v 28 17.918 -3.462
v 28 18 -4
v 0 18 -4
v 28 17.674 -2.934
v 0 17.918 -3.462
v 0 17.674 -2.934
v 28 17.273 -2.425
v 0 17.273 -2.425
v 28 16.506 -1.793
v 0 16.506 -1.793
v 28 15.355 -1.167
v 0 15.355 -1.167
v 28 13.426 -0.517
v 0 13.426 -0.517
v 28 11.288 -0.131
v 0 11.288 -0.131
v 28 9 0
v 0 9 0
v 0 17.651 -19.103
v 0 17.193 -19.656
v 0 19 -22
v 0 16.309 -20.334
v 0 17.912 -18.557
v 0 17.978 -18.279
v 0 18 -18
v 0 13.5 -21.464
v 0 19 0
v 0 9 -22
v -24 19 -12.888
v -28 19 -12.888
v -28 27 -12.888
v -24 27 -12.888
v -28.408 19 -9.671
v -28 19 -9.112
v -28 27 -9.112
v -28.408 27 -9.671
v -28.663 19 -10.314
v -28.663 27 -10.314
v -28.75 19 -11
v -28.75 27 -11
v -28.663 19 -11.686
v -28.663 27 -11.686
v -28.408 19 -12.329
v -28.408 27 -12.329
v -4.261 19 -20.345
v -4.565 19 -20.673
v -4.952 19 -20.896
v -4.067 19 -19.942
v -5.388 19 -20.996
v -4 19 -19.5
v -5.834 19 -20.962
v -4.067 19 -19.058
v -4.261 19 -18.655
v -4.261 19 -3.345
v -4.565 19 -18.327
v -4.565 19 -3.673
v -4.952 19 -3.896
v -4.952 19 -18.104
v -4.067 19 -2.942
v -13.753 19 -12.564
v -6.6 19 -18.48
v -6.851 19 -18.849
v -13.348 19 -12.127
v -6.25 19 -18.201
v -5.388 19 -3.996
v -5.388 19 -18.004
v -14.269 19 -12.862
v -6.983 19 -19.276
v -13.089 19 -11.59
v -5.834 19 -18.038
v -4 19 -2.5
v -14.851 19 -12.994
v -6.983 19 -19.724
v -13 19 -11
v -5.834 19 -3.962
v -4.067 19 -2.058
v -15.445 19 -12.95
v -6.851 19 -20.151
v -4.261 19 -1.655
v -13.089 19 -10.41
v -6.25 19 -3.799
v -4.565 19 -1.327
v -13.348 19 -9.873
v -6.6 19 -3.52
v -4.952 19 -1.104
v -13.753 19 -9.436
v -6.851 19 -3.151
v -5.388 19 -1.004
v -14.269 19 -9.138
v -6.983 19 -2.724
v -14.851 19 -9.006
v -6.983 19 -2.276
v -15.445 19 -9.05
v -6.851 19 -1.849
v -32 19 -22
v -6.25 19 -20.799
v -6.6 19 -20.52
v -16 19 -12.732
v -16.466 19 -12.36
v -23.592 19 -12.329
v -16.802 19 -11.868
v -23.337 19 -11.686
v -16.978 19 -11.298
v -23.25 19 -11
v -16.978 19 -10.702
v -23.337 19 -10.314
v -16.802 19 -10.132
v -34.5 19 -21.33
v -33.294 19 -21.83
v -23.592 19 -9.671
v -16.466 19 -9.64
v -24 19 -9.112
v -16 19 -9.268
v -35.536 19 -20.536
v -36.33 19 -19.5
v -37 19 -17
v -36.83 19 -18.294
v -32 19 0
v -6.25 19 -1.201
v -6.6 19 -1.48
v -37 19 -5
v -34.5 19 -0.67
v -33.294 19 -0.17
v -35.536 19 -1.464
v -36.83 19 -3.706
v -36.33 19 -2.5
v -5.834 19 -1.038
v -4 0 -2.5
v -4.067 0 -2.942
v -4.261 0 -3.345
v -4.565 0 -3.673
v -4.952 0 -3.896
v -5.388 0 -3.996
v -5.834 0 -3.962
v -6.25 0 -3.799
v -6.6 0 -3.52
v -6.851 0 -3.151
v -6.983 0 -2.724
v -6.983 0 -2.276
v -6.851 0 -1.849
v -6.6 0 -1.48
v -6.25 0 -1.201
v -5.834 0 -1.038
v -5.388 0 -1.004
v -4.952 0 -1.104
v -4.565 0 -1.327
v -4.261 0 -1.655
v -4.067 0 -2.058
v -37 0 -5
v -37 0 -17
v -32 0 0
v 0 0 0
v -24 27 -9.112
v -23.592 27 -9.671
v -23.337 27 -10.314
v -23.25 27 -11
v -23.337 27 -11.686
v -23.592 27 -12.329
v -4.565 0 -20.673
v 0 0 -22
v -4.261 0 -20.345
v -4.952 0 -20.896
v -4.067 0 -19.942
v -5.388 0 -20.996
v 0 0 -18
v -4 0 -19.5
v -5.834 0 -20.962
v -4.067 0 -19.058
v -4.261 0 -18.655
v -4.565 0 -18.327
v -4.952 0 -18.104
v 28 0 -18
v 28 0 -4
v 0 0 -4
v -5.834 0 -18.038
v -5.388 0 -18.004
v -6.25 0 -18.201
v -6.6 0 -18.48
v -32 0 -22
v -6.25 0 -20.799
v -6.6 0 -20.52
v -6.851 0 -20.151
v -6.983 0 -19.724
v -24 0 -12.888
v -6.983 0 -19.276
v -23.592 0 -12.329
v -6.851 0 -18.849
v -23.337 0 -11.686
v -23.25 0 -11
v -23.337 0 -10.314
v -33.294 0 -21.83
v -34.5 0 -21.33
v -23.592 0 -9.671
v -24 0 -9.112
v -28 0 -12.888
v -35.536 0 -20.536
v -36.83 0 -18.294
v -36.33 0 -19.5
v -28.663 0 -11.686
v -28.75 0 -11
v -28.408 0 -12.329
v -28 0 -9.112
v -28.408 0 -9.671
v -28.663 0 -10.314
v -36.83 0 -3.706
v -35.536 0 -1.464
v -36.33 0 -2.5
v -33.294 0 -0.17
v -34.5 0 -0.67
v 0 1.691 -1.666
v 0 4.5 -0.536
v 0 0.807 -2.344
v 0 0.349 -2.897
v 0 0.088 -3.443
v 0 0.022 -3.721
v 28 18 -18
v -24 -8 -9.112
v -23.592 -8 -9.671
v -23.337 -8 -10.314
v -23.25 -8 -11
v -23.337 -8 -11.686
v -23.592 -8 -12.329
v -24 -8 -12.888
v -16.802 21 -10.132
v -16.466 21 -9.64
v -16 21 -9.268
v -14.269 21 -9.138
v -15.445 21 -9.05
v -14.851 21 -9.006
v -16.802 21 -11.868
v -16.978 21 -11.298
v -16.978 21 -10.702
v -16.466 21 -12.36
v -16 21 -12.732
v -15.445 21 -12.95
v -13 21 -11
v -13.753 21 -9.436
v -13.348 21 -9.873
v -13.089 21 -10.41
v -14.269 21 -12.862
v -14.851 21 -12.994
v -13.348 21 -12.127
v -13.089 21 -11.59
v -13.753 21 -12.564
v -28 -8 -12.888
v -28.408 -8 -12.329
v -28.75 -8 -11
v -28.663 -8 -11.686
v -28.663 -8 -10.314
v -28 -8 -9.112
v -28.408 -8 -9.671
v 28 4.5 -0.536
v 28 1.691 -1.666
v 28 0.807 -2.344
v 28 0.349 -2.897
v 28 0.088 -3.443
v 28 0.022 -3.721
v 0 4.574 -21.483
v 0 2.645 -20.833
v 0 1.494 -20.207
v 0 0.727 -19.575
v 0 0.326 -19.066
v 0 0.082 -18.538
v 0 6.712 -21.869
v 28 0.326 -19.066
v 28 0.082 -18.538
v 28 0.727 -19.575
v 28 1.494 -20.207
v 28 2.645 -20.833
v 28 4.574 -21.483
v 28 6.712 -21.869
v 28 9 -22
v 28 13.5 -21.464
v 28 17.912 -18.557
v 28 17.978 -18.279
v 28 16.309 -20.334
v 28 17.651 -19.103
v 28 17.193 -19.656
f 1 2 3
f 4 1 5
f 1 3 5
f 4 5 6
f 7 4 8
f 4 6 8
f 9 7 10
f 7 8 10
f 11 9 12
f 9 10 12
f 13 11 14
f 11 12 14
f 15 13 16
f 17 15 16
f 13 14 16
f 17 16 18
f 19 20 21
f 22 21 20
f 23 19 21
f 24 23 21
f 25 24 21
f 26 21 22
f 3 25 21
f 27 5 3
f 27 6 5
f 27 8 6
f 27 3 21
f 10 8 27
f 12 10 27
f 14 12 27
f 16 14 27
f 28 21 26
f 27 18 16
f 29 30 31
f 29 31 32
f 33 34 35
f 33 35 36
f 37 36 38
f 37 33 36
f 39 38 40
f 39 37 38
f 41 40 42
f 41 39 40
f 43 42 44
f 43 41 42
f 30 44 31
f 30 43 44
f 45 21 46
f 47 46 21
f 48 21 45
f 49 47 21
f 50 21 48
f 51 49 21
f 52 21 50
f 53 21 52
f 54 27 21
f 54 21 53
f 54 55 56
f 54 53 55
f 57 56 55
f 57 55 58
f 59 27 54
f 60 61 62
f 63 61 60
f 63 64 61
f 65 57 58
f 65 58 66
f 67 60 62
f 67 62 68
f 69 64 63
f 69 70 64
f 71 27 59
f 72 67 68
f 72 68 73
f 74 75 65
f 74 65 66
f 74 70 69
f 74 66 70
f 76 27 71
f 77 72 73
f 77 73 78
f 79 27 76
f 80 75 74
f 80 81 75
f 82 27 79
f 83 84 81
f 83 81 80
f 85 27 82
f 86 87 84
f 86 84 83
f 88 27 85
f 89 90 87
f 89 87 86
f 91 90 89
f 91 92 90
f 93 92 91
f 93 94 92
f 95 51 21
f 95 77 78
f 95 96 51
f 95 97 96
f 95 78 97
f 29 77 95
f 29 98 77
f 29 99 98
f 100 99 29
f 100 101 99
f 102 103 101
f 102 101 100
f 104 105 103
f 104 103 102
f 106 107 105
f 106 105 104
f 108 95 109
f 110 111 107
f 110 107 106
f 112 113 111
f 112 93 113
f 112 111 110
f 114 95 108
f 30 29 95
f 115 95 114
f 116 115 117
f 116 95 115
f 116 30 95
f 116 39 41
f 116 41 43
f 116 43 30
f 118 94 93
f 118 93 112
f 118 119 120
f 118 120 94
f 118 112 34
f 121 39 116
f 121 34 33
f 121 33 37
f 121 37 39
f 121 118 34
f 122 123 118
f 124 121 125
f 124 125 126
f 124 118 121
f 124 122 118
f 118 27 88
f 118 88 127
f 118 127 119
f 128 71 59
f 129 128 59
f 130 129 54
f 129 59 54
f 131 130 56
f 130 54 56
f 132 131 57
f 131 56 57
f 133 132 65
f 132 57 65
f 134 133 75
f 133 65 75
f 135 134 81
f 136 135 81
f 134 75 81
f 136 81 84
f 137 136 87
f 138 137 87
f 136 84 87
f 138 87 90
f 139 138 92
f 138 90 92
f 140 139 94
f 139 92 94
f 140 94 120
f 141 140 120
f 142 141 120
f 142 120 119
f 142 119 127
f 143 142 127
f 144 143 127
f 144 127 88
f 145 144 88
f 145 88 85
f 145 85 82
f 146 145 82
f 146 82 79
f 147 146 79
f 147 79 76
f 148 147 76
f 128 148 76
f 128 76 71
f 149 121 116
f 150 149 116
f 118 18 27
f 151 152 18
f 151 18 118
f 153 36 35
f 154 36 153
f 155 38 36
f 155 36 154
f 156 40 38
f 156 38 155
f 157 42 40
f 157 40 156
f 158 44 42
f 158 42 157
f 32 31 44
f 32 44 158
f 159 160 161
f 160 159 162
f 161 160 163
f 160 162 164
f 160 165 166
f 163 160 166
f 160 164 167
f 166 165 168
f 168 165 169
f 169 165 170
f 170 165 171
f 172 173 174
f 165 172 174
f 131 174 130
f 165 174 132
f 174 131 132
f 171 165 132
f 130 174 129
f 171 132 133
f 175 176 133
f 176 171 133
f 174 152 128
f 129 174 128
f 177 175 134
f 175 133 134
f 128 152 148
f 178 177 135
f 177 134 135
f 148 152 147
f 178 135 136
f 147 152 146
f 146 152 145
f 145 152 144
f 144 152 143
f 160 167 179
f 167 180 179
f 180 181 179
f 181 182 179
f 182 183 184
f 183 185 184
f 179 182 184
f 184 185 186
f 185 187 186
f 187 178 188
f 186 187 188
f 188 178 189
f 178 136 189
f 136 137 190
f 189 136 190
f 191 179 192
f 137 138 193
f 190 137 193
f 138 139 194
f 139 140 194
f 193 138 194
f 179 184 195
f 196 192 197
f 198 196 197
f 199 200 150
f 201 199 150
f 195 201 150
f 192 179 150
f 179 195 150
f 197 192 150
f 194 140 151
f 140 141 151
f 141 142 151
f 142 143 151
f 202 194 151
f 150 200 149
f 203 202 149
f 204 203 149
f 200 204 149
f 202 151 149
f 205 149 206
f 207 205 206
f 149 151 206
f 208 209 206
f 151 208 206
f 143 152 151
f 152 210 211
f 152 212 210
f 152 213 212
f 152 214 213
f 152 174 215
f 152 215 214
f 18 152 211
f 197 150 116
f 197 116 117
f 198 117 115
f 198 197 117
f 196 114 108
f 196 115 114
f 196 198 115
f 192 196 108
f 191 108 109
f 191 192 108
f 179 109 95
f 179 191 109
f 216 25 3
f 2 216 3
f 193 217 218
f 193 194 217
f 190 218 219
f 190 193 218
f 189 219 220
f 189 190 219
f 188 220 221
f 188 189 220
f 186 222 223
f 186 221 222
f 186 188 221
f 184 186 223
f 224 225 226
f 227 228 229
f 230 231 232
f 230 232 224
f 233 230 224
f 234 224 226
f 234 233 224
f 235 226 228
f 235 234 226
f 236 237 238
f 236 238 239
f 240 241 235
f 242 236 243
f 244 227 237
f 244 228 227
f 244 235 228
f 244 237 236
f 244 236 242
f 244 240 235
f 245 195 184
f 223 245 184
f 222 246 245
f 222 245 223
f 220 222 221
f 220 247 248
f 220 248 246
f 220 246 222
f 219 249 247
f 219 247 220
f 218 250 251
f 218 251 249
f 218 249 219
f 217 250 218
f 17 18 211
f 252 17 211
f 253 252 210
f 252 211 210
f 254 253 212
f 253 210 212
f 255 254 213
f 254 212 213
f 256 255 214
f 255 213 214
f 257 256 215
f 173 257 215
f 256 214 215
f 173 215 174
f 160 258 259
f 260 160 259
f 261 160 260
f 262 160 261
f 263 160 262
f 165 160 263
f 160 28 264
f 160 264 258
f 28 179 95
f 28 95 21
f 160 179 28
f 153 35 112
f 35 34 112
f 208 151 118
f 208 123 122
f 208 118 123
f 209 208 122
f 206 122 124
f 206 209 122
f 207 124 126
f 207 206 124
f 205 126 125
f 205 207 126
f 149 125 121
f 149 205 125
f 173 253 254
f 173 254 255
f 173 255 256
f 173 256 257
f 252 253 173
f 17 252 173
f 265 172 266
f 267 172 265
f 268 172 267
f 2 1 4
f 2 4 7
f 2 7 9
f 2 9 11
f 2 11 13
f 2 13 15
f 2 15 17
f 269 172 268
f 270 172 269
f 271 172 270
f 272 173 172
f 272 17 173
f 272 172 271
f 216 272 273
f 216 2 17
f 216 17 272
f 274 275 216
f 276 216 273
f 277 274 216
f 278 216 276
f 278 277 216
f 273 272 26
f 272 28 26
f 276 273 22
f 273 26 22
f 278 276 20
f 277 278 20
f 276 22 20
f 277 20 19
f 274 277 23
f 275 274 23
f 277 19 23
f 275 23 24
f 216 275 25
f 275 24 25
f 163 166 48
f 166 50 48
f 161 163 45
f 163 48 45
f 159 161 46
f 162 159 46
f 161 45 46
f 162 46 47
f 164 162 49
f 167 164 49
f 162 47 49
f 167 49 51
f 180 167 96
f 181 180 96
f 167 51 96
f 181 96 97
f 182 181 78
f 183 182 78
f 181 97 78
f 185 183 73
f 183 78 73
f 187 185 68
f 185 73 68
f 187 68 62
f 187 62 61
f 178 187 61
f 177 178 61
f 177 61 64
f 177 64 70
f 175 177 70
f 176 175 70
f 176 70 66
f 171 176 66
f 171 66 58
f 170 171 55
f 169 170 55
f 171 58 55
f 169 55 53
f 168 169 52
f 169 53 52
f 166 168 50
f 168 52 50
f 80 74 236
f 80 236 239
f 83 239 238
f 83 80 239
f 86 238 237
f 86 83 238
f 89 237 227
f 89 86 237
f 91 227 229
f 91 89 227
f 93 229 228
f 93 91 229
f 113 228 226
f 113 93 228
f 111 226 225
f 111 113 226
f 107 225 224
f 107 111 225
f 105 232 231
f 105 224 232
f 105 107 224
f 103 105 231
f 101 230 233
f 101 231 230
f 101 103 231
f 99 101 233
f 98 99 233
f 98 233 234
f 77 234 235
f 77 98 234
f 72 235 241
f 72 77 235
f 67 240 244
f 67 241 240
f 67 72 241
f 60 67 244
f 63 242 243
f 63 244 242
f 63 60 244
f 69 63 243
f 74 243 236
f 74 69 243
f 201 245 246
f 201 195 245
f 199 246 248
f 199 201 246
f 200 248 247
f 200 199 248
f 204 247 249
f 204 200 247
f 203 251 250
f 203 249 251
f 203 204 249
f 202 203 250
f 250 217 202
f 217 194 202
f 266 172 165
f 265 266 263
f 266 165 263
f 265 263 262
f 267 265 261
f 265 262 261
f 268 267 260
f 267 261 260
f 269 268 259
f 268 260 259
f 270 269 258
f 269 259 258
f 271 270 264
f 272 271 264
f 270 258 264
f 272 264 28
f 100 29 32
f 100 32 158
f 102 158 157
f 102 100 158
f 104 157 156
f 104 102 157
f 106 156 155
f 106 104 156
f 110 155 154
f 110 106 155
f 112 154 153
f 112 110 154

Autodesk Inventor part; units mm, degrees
ref_plane "YZ Plane" through (0, 0, 0) normal (1, 0, 0) x (0, 1, 0)
ref_plane "XZ Plane" through (0, 0, 0) normal (0, 1, 0) x (-1, 0, 0)
ref_plane "XY Plane" through (0, 0, 0) normal (0, 0, 1) x (1, 0, 0)
sketch "スケッチ1" plane through (0, 0, 0) normal (0, 1, 0) x (-1, 0, 0)
  line L0 (0, 0) -> (37, 0)
  line L1 (37, 0) -> (37, -22)
  line L2 (37, -22) -> (0, -22)
  line L3 (0, -22) -> (0, 0)
  line L4 (37, 0) -> (37, -3.6217)
  line L5 (37, 0) -> (32, 0)
  line L6 (32, 0) -> (32, -5)
  line L7 (32, -5) -> (37, -5)
  line L8 (37, -5) -> (37, 0)
  circle A0 centre (32, -5) radius 5
  line L9 (37, -22) -> (32, -22)
  line L10 (32, -22) -> (32, -17)
  line L11 (32, -17) -> (37, -17)
  line L12 (37, -17) -> (37, -22)
  circle A1 centre (32, -17) radius 5
  dimension "d1" = 22
  dimension "d2" = 37
  dimension "d6" = 5
  dimension "d7" = 5
extrude "押し出し1" add sketch "スケッチ1" along normal blind 19 contours L0 A0 L1 A1 L2 L3 | A0 L7 L6 | L6 L7 A0 | A1 L11 L10 | L10 L11 A1
sketch "スケッチ2" plane through (0, 19, 0) normal (0, 1, 0) x (1, 0, 0)
  line L0 (0, 0) -> (0, 22) projected
  line L1 (0, 0) -> (0, 22)
  line L2 (0, 11) -> (-37, 11)
  line L3 (-37, 17) -> (-37, 5) projected
  line L4 (-37, 11) -> (-26, 11)
  circle A0 centre (-26, 11) radius 2.75
  line L5 (-28, 9.1125) -> (-24, 9.1125)
  line L6 (-28, 12.8875) -> (-24, 12.8875)
  dimension "d10" = 11
  dimension "d11" = 5.5
  dimension "d12" = 4
extrude "押し出し2" add sketch "スケッチ2" along normal blind 8 contours A0 L5 L2 | L2 A0 L6
sketch "スケッチ3" plane through (0, 0, 0) normal (0, -1, 0) x (1, 0, 0)
  arc A0 (-24, -12.8875) -> (-24, -9.1125) centre (-26, -11) ccw projected
  line L0 (-28, -12.8875) -> (-24, -12.8875) projected
  arc A1 (-28, -9.1125) -> (-28, -12.8875) centre (-26, -11) ccw projected
  line L1 (-24, -9.1125) -> (-28, -9.1125) projected
  point P0 (0, 0)
extrude "押し出し3" add sketch "スケッチ3" along normal blind 8
sketch "スケッチ4" plane through (0, 19, 0) normal (0, 1, 0) x (1, 0, 0)
  line L0 (0, 0) -> (0, 22) projected
  line L1 (0, 11) -> (-15, 11)
  circle A0 centre (-15, 11) radius 2
  dimension "d17" = 15
  dimension "d18" = 4
extrude "押し出し4" add sketch "スケッチ4" along normal blind 2
sketch "スケッチ5" plane through (0, 0, 0) normal (1, 0, 0) x (0, 0, -1)
  line L0 (22, 0) -> (22, 19) projected
  line L1 (0, 0) -> (22, 0)
  line L2 (22, 0) -> (22, 18)
  line L3 (22, 18) -> (0, 18)
  line L4 (0, 18) -> (0, 0)
  line L5 (0, 0) -> (0, 19) projected
  line L6 (0, 9) -> (22, 9)
  line L7 (11, 0) -> (11, 18)
  line L8 (4, 9) -> (4, 0)
  ellipse E0 centre (4, 9) end of major axis (0, 9) minor radius 9
  ellipse E1 centre (18, 9) end of major axis (22, 9) minor radius 9
  point P0 (4, 18)
  point P1 (18, 0)
  point P2 (18, 18)
  dimension "d21" = 18
extrude "押し出し5" add sketch "スケッチ5" along normal blind 28 contours E1 L6 | L6 E1 | L1 L7 L6 E1 | L6 L7 L3 E1 | L1 E0 L6 L7 | L6 E0 L3 L7 | E0 L6 L8 | L8 L6 E0 | L6 E0
sketch "スケッチ6" plane through (0, 19, 0) normal (0, 1, 0) x (1, 0, 0)
  arc A0 (-32, 22) -> (-37, 17) centre (-32, 17) ccw projected
  line L0 (0, 0) -> (0, 22) projected
  line L1 (-32, 22) -> (0, 22)
  line L2 (0, 22) -> (-2.4665, 22)
  line L3 (0, 0) -> (-5.5, 0)
  line L4 (-32, 0) -> (0, 0) projected
  line L5 (-5.5, 0) -> (-5.5, 2.5)
  circle A1 centre (-5.5, 2.5) radius 1.5
  line L6 (0, 11) -> (-37, 11)
  line L7 (-37, 17) -> (-37, 5) projected
  circle A2 centre (-5.5, 19.5) radius 1.5
  dimension "d25" = 5.5
  dimension "d26" = 2.5
  dimension "d27" = 3
extrude "押し出し6" cut sketch "スケッチ6" against normal blind 22 contours A1 | A2
properties part number "黄モーター"
